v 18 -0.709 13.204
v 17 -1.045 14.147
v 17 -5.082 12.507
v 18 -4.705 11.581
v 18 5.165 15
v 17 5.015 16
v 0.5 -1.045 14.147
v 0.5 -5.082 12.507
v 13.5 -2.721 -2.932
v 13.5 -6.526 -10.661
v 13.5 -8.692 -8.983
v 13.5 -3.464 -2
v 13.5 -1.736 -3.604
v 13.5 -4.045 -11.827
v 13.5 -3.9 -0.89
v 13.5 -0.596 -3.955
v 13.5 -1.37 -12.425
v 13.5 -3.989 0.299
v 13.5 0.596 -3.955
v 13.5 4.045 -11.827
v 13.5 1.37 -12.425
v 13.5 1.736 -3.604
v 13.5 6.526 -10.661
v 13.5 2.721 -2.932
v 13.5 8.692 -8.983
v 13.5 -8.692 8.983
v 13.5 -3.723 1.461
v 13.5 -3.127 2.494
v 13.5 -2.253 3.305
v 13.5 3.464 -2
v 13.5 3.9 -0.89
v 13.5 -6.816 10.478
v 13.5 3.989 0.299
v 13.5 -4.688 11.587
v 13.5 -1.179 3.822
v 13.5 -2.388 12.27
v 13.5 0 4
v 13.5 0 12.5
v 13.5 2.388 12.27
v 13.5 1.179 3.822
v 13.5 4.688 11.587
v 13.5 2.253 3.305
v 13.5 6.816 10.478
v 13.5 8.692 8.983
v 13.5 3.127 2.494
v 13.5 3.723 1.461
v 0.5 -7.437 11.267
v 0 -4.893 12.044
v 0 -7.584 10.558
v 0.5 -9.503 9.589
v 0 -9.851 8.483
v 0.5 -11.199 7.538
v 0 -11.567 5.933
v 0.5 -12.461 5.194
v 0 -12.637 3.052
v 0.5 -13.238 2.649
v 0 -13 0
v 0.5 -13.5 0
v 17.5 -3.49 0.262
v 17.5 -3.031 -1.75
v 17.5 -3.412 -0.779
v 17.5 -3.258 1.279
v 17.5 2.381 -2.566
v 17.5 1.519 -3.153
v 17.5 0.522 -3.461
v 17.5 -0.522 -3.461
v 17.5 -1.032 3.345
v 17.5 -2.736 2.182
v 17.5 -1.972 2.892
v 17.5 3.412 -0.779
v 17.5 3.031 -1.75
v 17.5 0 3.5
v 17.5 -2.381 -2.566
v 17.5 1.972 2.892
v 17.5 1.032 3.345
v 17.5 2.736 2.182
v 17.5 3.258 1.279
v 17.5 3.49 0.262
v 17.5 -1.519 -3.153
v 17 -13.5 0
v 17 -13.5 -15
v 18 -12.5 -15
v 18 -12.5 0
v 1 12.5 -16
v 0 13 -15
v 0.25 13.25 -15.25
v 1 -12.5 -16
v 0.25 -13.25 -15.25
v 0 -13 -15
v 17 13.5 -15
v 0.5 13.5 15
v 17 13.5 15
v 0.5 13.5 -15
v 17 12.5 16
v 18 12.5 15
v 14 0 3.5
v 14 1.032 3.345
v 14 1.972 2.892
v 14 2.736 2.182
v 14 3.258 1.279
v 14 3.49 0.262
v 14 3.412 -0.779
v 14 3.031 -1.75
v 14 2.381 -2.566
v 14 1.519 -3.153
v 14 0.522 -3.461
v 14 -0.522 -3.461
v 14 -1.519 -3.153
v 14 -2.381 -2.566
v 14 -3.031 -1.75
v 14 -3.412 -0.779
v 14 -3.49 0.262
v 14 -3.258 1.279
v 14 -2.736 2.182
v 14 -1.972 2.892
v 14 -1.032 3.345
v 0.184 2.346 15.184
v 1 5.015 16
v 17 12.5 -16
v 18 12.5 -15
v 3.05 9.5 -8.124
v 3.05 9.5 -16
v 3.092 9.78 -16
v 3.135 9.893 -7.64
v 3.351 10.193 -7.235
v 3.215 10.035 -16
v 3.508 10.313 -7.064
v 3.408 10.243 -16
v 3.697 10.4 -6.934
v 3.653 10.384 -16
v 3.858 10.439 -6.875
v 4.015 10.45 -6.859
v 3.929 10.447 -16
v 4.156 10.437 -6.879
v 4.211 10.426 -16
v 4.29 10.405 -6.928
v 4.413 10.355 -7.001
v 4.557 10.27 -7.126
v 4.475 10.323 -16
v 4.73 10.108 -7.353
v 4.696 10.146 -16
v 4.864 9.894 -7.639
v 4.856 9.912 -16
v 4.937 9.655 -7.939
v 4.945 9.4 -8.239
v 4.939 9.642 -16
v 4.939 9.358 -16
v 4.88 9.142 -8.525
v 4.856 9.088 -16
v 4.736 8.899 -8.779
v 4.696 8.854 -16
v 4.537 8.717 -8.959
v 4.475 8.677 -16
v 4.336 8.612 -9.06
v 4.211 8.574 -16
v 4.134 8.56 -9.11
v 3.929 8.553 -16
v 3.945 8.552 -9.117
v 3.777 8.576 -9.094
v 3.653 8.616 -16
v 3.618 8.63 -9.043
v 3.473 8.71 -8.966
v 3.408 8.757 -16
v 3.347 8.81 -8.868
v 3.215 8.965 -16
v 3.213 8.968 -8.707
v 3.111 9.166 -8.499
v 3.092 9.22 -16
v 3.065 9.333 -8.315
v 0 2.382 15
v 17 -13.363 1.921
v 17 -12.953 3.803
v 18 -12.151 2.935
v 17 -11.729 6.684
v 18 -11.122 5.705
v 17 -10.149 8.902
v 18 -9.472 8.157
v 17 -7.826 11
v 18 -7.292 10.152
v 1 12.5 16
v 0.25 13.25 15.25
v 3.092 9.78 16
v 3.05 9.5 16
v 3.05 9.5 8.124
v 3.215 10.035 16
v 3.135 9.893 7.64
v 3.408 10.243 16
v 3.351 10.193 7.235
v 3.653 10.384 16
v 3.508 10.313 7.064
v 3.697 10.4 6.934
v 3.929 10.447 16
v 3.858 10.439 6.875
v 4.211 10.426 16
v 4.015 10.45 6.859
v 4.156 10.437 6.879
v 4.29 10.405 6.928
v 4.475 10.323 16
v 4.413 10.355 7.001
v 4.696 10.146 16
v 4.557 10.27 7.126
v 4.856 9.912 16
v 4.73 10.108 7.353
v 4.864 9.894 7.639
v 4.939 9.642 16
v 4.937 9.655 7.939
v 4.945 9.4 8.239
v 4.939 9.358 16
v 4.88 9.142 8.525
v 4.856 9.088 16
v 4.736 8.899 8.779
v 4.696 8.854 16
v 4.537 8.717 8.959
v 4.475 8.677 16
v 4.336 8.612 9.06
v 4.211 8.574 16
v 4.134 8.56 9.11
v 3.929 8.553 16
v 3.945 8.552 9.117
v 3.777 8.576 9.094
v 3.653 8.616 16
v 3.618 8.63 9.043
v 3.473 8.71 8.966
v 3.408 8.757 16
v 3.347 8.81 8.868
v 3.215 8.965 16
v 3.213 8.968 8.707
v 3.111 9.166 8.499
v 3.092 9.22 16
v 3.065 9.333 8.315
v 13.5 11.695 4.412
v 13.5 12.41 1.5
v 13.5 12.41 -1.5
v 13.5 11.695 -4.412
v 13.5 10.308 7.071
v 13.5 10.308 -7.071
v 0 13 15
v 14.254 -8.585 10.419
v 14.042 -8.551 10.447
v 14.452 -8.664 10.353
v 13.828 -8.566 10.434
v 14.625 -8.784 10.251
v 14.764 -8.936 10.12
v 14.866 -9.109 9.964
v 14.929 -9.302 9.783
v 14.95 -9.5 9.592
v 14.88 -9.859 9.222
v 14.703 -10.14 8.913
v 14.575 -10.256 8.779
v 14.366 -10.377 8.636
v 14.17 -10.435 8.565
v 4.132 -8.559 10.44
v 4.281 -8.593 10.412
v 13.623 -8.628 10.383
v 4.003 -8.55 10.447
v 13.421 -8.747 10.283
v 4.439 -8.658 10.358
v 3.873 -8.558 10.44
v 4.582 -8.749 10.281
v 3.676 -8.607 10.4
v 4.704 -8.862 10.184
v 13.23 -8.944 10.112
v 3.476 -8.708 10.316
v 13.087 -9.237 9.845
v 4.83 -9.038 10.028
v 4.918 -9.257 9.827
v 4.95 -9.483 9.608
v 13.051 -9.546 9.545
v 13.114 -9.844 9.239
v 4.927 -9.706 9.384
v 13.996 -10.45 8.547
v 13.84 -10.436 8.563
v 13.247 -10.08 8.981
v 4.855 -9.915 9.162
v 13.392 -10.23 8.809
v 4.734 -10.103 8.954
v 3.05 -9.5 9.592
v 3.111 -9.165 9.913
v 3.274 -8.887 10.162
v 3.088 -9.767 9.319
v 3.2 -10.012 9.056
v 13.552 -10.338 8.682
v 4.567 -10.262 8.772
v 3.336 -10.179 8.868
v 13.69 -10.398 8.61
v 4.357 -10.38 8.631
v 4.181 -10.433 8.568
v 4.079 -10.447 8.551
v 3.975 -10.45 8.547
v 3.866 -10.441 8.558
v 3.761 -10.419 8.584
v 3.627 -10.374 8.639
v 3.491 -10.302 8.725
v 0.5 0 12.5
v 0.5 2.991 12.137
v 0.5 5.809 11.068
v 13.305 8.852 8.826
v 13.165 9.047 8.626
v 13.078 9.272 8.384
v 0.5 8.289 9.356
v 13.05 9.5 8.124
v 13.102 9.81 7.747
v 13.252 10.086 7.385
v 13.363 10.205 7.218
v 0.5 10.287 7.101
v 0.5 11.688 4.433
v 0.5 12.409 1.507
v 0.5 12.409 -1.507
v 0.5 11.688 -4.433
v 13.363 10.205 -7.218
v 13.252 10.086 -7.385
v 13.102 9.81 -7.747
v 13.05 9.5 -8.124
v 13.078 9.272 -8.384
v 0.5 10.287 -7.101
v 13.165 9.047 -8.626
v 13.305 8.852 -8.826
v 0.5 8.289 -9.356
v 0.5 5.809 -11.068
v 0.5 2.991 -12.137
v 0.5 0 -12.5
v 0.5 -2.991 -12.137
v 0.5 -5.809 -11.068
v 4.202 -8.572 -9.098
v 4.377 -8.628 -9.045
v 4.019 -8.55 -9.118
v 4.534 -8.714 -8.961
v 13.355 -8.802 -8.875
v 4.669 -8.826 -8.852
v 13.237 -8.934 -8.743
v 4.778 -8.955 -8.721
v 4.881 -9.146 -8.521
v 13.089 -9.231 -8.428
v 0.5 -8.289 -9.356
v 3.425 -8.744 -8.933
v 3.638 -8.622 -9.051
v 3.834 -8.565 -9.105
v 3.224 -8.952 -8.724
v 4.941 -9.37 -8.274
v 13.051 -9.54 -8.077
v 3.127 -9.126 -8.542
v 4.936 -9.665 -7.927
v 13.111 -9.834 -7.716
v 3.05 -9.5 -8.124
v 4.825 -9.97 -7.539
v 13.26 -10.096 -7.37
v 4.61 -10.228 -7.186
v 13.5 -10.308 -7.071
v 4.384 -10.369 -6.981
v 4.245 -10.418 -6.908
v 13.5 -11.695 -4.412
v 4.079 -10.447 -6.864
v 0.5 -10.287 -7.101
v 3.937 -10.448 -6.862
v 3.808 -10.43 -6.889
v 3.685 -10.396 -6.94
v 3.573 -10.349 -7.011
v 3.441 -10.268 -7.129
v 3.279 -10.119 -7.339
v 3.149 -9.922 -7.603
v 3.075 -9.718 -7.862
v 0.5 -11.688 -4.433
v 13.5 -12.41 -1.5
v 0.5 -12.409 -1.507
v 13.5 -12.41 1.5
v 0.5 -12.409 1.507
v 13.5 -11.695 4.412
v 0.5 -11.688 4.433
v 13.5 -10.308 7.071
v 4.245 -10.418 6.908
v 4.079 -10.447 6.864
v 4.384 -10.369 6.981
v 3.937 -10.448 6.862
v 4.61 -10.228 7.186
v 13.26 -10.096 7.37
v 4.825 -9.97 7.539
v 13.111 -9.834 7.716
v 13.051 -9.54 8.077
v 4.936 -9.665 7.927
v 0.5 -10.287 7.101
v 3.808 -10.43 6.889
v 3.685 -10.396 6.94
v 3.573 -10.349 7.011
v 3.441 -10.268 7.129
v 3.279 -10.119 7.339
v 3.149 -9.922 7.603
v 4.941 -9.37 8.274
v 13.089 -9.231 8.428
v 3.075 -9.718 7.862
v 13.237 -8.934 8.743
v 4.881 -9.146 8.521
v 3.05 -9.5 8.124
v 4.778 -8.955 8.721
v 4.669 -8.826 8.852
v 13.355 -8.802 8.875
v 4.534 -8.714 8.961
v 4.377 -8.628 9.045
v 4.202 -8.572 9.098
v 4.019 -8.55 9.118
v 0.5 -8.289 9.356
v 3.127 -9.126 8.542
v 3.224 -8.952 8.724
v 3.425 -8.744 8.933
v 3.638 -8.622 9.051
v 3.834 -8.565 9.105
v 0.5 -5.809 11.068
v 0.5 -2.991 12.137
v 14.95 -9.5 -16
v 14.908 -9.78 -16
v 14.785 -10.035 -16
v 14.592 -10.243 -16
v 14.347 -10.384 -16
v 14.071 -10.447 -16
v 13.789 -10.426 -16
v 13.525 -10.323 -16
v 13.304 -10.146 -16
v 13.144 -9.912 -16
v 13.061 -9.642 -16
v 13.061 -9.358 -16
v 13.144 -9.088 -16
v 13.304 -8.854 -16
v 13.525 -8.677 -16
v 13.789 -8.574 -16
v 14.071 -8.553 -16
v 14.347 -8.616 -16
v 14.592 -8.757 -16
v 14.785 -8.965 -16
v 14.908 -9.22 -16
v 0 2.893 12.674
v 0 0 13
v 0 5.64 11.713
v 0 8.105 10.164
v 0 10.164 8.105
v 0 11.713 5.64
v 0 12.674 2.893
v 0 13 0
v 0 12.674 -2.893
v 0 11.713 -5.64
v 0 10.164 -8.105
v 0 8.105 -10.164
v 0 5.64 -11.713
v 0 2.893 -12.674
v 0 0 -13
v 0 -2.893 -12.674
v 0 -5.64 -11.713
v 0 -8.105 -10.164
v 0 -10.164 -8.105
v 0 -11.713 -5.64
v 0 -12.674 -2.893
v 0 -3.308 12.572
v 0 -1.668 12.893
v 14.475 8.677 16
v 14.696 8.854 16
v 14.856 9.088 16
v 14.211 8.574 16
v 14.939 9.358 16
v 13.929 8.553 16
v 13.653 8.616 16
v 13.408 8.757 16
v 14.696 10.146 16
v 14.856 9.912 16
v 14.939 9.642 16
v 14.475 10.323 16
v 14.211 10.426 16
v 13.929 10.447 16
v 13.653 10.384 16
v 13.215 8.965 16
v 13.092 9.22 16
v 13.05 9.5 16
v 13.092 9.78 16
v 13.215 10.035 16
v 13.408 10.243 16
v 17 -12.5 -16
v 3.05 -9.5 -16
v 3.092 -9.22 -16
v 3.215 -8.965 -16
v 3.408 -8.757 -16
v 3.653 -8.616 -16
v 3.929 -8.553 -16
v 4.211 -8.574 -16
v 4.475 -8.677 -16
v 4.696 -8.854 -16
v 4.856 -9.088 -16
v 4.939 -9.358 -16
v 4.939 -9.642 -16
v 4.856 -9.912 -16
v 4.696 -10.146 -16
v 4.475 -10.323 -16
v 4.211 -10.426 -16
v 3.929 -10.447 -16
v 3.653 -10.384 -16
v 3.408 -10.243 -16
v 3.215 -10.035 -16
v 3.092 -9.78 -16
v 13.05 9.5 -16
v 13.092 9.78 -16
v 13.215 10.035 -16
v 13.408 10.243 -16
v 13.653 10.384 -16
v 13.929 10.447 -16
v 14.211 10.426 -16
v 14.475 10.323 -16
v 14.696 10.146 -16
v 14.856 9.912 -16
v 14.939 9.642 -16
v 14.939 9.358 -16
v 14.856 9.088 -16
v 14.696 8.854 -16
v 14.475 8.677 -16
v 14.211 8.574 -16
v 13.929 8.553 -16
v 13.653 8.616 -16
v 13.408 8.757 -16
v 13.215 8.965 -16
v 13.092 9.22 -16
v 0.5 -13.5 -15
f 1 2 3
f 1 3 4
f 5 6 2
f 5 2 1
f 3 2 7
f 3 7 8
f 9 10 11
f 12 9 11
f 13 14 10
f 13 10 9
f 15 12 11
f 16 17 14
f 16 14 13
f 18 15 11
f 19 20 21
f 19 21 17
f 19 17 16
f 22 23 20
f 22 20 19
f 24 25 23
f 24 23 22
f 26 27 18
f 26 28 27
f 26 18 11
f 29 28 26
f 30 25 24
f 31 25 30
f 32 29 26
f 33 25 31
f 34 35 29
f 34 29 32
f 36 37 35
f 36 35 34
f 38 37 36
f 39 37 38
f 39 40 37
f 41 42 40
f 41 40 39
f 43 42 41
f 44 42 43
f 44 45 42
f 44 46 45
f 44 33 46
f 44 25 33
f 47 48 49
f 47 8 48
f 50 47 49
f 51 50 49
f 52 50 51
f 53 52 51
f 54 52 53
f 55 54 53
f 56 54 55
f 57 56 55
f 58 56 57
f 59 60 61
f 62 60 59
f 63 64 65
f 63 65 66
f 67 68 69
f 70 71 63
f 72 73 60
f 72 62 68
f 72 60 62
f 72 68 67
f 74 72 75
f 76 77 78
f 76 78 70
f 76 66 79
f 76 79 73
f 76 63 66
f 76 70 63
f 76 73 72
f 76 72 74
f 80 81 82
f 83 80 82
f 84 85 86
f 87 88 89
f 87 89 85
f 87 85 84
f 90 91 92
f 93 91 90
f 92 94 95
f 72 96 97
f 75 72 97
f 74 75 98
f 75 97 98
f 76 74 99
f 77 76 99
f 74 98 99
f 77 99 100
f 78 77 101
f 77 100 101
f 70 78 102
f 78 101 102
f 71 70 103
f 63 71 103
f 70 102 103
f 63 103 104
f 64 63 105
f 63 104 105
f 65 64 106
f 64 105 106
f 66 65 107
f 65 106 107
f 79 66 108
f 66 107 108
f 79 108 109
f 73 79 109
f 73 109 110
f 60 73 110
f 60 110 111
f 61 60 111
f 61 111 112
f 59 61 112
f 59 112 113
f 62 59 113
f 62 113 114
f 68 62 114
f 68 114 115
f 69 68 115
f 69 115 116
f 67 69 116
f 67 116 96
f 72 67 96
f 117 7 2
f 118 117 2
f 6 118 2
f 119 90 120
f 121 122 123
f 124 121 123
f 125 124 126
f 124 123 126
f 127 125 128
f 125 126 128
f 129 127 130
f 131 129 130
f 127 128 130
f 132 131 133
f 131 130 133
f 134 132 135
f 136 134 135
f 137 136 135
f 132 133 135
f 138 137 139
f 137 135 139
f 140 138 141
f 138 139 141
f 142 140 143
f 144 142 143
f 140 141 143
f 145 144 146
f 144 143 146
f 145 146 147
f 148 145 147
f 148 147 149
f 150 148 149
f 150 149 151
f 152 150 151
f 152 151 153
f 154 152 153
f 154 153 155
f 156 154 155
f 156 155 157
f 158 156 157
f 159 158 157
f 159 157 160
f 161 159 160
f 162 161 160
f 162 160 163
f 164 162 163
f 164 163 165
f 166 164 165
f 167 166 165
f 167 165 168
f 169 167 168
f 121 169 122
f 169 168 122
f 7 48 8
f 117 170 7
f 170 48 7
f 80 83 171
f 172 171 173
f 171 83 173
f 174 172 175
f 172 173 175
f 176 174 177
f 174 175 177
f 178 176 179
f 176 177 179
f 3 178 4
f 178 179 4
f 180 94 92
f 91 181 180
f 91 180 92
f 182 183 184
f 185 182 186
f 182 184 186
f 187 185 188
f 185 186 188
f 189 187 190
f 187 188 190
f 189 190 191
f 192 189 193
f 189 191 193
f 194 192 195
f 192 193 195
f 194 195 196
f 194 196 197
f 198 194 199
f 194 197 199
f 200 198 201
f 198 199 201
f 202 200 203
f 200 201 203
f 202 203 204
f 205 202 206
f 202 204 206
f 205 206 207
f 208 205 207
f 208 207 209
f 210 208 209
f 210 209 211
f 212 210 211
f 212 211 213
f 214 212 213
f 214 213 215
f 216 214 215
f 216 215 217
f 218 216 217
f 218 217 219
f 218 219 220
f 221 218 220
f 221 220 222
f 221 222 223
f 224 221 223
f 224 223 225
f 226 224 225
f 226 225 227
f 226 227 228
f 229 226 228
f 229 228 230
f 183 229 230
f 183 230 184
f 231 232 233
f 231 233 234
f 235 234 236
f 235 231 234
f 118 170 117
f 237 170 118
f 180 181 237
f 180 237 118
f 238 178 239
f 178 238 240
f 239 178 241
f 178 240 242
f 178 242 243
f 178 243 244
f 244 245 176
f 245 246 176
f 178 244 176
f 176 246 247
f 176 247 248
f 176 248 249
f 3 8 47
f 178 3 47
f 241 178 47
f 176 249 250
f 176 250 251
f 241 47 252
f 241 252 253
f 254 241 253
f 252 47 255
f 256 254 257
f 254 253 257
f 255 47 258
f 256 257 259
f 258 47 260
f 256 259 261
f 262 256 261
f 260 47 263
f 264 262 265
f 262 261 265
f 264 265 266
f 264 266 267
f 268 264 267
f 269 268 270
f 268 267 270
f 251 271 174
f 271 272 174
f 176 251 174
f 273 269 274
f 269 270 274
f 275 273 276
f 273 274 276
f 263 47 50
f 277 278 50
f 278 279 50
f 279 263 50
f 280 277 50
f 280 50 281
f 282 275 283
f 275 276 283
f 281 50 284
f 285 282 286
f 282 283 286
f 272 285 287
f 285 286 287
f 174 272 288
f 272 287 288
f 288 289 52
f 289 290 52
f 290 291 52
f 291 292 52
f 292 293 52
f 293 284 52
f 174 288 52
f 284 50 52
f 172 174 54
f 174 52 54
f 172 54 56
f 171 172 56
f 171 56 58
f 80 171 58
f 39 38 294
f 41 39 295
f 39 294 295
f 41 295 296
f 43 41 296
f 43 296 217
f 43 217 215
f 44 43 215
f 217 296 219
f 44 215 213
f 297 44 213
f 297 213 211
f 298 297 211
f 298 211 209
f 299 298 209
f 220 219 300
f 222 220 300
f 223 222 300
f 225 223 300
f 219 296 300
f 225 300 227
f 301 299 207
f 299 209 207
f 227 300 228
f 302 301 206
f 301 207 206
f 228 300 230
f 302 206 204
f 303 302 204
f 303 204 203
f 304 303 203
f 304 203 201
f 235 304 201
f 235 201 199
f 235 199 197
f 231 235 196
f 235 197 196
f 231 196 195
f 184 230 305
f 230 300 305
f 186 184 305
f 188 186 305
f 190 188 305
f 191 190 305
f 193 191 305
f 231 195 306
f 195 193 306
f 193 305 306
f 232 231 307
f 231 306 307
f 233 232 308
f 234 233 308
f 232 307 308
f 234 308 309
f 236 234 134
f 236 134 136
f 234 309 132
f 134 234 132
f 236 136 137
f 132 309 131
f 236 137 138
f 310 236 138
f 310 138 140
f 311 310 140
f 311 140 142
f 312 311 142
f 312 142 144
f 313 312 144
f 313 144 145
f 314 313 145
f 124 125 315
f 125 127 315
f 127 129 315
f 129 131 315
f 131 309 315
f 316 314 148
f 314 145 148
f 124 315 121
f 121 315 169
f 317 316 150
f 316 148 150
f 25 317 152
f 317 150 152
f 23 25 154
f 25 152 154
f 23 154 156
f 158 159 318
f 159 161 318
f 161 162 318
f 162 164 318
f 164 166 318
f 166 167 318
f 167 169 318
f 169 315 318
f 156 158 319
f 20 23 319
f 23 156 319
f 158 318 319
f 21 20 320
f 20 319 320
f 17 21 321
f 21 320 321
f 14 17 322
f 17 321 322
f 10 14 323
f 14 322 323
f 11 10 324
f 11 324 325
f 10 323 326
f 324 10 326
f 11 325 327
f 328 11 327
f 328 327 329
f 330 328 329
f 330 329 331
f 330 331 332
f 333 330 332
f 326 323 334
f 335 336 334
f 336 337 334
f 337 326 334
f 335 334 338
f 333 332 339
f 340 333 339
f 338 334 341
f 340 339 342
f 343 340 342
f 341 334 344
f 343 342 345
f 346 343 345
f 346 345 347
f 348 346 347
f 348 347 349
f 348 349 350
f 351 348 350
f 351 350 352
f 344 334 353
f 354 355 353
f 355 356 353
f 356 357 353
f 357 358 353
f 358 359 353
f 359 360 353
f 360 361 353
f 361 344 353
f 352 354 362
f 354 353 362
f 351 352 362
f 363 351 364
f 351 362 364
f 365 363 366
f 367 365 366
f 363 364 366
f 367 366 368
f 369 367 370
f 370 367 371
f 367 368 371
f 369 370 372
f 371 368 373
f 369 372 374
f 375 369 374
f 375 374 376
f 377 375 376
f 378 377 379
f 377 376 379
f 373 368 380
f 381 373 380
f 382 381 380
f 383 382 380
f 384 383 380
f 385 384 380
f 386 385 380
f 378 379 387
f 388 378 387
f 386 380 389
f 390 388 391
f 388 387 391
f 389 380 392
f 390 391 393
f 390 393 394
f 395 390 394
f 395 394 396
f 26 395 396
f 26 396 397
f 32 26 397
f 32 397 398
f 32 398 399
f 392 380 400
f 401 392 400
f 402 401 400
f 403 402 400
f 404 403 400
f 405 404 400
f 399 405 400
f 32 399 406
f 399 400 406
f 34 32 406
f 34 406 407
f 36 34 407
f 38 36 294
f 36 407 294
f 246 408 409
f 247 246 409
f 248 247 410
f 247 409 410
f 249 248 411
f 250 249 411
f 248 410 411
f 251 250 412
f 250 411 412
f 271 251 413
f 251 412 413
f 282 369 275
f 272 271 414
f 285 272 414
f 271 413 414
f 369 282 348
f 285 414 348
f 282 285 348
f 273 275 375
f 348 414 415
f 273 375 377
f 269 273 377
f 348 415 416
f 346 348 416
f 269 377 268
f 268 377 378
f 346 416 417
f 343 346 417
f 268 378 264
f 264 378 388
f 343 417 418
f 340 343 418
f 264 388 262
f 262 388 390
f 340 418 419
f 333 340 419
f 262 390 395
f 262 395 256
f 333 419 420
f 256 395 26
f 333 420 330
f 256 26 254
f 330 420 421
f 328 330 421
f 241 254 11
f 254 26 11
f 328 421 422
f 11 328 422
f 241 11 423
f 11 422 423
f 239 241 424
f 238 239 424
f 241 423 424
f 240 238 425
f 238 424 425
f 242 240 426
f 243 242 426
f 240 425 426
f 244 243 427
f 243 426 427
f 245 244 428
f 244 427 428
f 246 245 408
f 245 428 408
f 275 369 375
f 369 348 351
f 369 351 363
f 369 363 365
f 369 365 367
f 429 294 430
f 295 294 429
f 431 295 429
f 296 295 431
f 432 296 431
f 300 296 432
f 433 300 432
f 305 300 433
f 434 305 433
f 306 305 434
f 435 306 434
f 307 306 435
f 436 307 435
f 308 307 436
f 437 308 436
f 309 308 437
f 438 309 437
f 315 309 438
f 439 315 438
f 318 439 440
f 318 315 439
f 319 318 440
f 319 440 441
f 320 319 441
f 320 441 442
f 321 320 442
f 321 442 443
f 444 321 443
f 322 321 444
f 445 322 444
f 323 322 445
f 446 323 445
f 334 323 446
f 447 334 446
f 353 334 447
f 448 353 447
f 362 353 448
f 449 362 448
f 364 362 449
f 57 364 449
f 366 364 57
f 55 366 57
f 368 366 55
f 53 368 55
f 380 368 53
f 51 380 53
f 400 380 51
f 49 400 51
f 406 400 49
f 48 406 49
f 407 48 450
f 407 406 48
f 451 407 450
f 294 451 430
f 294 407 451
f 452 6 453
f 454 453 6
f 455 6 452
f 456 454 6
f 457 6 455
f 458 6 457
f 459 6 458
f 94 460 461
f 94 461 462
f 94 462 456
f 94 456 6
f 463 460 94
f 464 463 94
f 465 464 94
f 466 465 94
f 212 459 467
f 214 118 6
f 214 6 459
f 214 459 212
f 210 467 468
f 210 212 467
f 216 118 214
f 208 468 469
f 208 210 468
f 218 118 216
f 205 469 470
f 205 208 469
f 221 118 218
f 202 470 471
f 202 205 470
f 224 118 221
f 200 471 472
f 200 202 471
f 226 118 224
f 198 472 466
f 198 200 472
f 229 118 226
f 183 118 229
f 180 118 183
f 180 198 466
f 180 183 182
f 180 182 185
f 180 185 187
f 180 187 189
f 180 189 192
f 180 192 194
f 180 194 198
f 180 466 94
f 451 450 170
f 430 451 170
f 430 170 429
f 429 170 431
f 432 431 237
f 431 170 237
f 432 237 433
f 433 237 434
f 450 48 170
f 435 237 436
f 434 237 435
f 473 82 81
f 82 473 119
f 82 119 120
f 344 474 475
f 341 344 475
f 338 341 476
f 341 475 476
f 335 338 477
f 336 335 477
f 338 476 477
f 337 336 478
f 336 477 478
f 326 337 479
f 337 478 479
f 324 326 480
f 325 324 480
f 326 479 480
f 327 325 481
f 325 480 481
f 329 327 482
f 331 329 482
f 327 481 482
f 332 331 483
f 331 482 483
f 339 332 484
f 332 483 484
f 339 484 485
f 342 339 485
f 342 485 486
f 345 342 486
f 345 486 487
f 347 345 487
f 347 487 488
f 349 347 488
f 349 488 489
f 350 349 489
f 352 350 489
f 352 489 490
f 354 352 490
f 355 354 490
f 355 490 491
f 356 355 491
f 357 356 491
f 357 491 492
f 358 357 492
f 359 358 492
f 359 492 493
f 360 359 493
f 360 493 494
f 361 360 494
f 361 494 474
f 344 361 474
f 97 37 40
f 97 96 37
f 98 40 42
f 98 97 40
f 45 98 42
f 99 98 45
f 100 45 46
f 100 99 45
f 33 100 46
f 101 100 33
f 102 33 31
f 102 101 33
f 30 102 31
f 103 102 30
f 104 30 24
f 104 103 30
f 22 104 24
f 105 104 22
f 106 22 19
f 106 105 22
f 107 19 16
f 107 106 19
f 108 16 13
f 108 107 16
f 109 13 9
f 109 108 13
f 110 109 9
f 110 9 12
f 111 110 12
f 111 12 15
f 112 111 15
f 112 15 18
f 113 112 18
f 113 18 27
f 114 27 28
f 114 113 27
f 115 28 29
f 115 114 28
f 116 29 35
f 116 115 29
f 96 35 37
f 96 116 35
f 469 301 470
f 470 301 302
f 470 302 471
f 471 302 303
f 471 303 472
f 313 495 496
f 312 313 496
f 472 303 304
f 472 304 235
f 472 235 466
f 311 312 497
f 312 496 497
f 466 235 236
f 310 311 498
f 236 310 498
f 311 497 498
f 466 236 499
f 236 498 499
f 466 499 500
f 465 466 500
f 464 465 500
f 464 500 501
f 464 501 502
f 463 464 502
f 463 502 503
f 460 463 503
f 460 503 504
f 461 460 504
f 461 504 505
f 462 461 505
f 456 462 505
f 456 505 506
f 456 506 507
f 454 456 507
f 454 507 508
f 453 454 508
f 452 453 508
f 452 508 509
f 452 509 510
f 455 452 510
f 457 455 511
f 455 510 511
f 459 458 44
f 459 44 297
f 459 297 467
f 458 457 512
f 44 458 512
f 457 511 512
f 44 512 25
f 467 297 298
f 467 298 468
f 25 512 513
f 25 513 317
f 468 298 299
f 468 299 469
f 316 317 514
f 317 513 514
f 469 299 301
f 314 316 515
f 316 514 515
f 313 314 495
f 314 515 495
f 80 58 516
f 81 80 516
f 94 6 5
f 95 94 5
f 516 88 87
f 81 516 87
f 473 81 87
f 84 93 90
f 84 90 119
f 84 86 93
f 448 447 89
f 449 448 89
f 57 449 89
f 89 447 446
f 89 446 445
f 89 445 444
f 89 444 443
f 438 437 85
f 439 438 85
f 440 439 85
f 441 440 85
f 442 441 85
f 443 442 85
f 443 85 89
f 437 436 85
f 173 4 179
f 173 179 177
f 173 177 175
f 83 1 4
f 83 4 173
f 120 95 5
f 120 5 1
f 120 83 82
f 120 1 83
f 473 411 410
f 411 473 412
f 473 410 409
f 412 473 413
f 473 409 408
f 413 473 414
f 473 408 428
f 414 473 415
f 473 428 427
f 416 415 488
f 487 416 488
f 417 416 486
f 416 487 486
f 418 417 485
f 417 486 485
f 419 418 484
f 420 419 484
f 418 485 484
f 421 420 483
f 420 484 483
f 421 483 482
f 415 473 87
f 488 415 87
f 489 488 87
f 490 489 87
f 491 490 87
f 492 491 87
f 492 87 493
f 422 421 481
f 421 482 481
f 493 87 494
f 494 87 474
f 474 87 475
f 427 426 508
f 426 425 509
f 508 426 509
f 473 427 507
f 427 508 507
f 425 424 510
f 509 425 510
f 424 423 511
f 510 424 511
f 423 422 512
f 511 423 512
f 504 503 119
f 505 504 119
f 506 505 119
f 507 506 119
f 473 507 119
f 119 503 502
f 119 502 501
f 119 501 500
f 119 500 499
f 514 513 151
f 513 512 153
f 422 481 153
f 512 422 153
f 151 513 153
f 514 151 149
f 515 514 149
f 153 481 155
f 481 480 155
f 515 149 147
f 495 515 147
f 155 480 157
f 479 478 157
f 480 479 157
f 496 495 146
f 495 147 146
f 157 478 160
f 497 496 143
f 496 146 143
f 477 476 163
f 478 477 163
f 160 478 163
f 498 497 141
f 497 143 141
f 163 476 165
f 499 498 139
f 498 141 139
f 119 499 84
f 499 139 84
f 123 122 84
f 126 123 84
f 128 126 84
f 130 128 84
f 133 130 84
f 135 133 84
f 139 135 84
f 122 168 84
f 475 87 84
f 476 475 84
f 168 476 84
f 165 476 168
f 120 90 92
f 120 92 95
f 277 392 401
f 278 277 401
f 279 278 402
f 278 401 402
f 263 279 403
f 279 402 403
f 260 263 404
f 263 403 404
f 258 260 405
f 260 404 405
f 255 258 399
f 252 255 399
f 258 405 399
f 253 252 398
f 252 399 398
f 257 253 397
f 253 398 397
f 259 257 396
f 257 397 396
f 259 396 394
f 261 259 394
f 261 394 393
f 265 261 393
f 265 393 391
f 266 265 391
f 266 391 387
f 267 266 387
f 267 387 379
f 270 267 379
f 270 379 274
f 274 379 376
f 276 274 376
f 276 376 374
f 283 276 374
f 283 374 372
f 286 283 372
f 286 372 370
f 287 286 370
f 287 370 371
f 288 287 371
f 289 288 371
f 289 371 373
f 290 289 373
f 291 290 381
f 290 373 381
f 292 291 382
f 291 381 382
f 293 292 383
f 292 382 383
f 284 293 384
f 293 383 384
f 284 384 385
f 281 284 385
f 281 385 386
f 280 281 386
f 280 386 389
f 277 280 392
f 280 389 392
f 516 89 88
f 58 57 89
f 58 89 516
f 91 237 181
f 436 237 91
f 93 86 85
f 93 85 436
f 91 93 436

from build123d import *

# Parameters (mm, degrees)
SKETCH_1_W          = 32
SKETCH_1_H          = 27
EXTRUDE_1_DEPTH     = 18
SKETCH_2_R          = 12.5
CUT_EXTRUDE_1_DEPTH = 13.5
SKETCH_3_R          = 3.5
CUT_EXTRUDE_2_DEPTH = 4
SKETCH_4_R          = 0.95
CUT_EXTRUDE_3_DEPTH = 40.118409988
CUT_EXTRUDE_4_DEPTH = 28.608875443
CHAMFER_2_SIZE      = 1.5
CHAMFER_2_SIZE2     = 4.921659428
CHAMFER_4_SIZE      = 0.5


with BuildPart() as part:
    # 草图1 → 凸台-拉伸1 (new body)
    with BuildSketch(Plane(origin=(0, 0, 0), x_dir=(0, 0, -1), z_dir=(1, 0, 0))):
        Rectangle(SKETCH_1_W, SKETCH_1_H)
    extrude(amount=EXTRUDE_1_DEPTH)

    # 草图2 → 切除-拉伸1 (cut)
    with BuildSketch(Plane.ZY):
        Circle(SKETCH_2_R)
    extrude(amount=-CUT_EXTRUDE_1_DEPTH, mode=Mode.SUBTRACT)

    # 草图3 → 切除-拉伸2 (cut)
    with BuildSketch(Plane.ZY.offset(-13.5)):
        Circle(SKETCH_3_R)
    extrude(amount=-CUT_EXTRUDE_2_DEPTH, mode=Mode.SUBTRACT)

    # 草图4 → 切除-拉伸3 (cut, through all)
    with BuildSketch(Plane(origin=(0, 0, -16), x_dir=(-1, 0, 0), z_dir=(0, 0, -1))):
        with Locations((-14, 9.5)):
            Circle(SKETCH_4_R)
        with Locations((-4, 9.5)):
            Circle(SKETCH_4_R)
        with Locations((-4, -9.5)):
            Circle(SKETCH_4_R)
        with Locations(Location((-14, -9.5, 0), (0, 0, 180))):
            Circle(SKETCH_4_R)
    extrude(amount=-CUT_EXTRUDE_3_DEPTH, mode=Mode.SUBTRACT)

    # 草图6 → 切除-拉伸4 (cut, through all)
    with BuildSketch(Plane.ZY):
        with BuildLine():
            Line((16, -13.5), (16, 3.515112589))
            Line((16, 3.515112589), (12.507048233, -5.08170685))
            ThreePointArc((12.507048233, -5.08170685), (7.538134966, -11.199398253), (0, -13.5))
            Line((0, -13.5), (16, -13.5))
        make_face()
    extrude(amount=-CUT_EXTRUDE_4_DEPTH, mode=Mode.SUBTRACT)

    # 倒角2
    chamfer_2_edges = [part.edges().sort_by_distance(p)[0] for p in [
        (9, 3.515112589, 16),
    ]]
    chamfer_2_side = [part.faces().sort_by_distance(p)[0] for p in [
        (9, 8.475223706, 16),
    ]]
    chamfer(chamfer_2_edges, length=CHAMFER_2_SIZE, length2=CHAMFER_2_SIZE2, reference=chamfer_2_side[0])

    # 倒角3
    # the kernel refuses this chamfer: 1 mm, written as the material it takes off along each edge
    with BuildSketch(Plane(origin=(17.333333333, 12.833333333, 15.333333333), x_dir=(-0.7071067811865475, 0, 0.7071067811865475), z_dir=(0.5773502691896258, 0.5773502691896258, 0.5773502691896258)), Plane(origin=(17.333333333, 12.833333333, -15.333333333), x_dir=(-0.7071067811865475, 0.7071067811865475, 0), z_dir=(0.5773502691896258, 0.5773502691896258, -0.5773502691896258))) as chamfer_3_piece_1:
        Polygon((-0.707106781, 0.40824829), (0.707106781, 0.40824829), (0, -0.816496581), align=None)
    extrude(amount=1.270170592, mode=Mode.SUBTRACT)
    with BuildSketch(Plane(origin=(17.333333333, -12.833333333, -15.333333333), x_dir=(-0.7071067811865475, -0.7071067811865475, 0), z_dir=(0.5773502691896258, -0.5773502691896258, -0.5773502691896258))) as chamfer_3_piece_2:
        Polygon((-0.707106781, -0.40824829), (0.707106781, -0.40824829), (0, 0.816496581), align=None)
    extrude(amount=1.270170592, mode=Mode.SUBTRACT)
    with BuildSketch(Plane(origin=(18, 16.071682988, 16), x_dir=(-1, 0, 0), z_dir=(0, -1, 0)), Plane(origin=(0, 16.071682988, 16), x_dir=(0, 0, -1), z_dir=(0, -1, 0))) as chamfer_3_piece_3:
        with BuildLine():
            Line((1.028284271, -0.028284271), (-0.028284271, 1.028284271))
            Line((-0.028284271, 1.028284271), (-0.048284271, 1.028284271))
            ThreePointArc((-0.048284271, 1.028284271), (-0.02, 0.514142136), (-0.02, 0))
            Line((-0.02, 0), (0, -0.02))
            ThreePointArc((0, -0.02), (0.514142136, -0.02), (1.028284271, -0.048284271))
            Line((1.028284271, -0.048284271), (1.028284271, -0.028284271))
        make_face()
    extrude(amount=15.428431478, mode=Mode.SUBTRACT)
    with BuildSketch(Plane(origin=(18, -16.071682988, -16), x_dir=(-1, 0, 0), z_dir=(0, 1, 0)), Plane(origin=(0, -16.071682988, -16), x_dir=(0, 0, 1), z_dir=(0, 1, 0))) as chamfer_3_piece_4:
        with BuildLine():
            Line((1.028284271, -0.028284271), (-0.028284271, 1.028284271))
            Line((-0.028284271, 1.028284271), (-0.048284271, 1.028284271))
            ThreePointArc((-0.048284271, 1.028284271), (-0.02, 0.514142136), (-0.02, 0))
            Line((-0.02, 0), (0, -0.02))
            ThreePointArc((0, -0.02), (0.514142136, -0.02), (1.028284271, -0.048284271))
            Line((1.028284271, -0.048284271), (1.028284271, -0.028284271))
        make_face()
    extrude(amount=32.143365976, mode=Mode.SUBTRACT)
    with BuildSketch(Plane(origin=(18, -13.5, 0), x_dir=(-1, 0, 0), z_dir=(0, 0, -1))) as chamfer_3_piece_5:
        with BuildLine():
            Line((1.028284271, -0.028284271), (-0.028284271, 1.028284271))
            Line((-0.028284271, 1.028284271), (-0.048284271, 1.028284271))
            ThreePointArc((-0.048284271, 1.028284271), (-0.02, 0.514142136), (-0.02, 0))
            Line((-0.02, 0), (0, -0.02))
            ThreePointArc((0, -0.02), (0.514142136, -0.02), (1.028284271, -0.048284271))
            Line((1.028284271, -0.048284271), (1.028284271, -0.028284271))
        make_face()
    extrude(amount=18.571682988, mode=Mode.SUBTRACT)
    with BuildSketch(Plane(origin=(18, 0, 0), x_dir=(0, -1, 0), z_dir=(0, 0, -1))) as chamfer_3_piece_6:
        with BuildLine():
            Line((13.528284271, 1.028284271), (12.471715729, -0.028284271))
            Line((12.471715729, -0.028284271), (12.471715729, -0.048284271))
            ThreePointArc((12.471715729, -0.048284271), (12.985857864, -0.02), (13.5, -0.02))
            Line((13.5, -0.02), (13.52, 0))
            ThreePointArc((13.52, 0), (13.52, 0.514142136), (13.548284271, 1.028284271))
            Line((13.548284271, 1.028284271), (13.528284271, 1.028284271))
        make_face()
    revolve(axis=Axis((18, 0, 0), (-1, 0, 0)), revolution_arc=67.887726461, mode=Mode.SUBTRACT)
    with BuildSketch(Plane(origin=(18, -5.08170685, 12.507048233), x_dir=(-1, 0, 0), z_dir=(0, 0.9264480172326814, 0.3764227296081273))) as chamfer_3_piece_7:
        with BuildLine():
            Line((1.028284271, 0.028284271), (-0.028284271, -1.028284271))
            Line((-0.028284271, -1.028284271), (-0.048284271, -1.028284271))
            ThreePointArc((-0.048284271, -1.028284271), (-0.02, -0.514142136), (-0.02, 0))
            Line((-0.02, 0), (0, 0.02))
            ThreePointArc((0, 0.02), (0.514142136, 0.02), (1.028284271, 0.048284271))
            Line((1.028284271, 0.048284271), (1.028284271, 0.028284271))
        make_face()
    extrude(amount=17.216088275, mode=Mode.SUBTRACT)
    with BuildSketch(Plane(origin=(18, 9.195944132, 17.278208477), x_dir=(-1, 0, 0), z_dir=(0, -0.9563047559630353, -0.2923717047227372))) as chamfer_3_piece_8:
        with BuildLine():
            Line((1.028284271, -0.028284271), (-0.028284271, 1.028284271))
            Line((-0.028284271, 1.028284271), (-0.048284271, 1.028284271))
            ThreePointArc((-0.048284271, 1.028284271), (-0.02, 0.514142136), (-0.02, 0))
            Line((-0.02, 0), (0, -0.02))
            ThreePointArc((0, -0.02), (0.514142136, -0.02), (1.028284271, -0.048284271))
            Line((1.028284271, -0.048284271), (1.028284271, -0.028284271))
        make_face()
    extrude(amount=23.566814221, mode=Mode.SUBTRACT)
    with BuildSketch(Plane(origin=(-2.571682988, -13.5, -16), x_dir=(0, 0, 1), z_dir=(1, 0, 0))) as chamfer_3_piece_9:
        with BuildLine():
            Line((1.028284271, 0.028284271), (-0.028284271, -1.028284271))
            Line((-0.028284271, -1.028284271), (-0.048284271, -1.028284271))
            ThreePointArc((-0.048284271, -1.028284271), (-0.02, -0.514142136), (-0.02, 0))
            Line((-0.02, 0), (0, 0.02))
            ThreePointArc((0, 0.02), (0.514142136, 0.02), (1.028284271, 0.048284271))
            Line((1.028284271, 0.048284271), (1.028284271, 0.028284271))
        make_face()
    extrude(amount=23.143365976, mode=Mode.SUBTRACT)
    with BuildSketch(Plane(origin=(-2.571682988, 13.5, 16), x_dir=(0, -1, 0), z_dir=(1, 0, 0)), Plane(origin=(-2.571682988, 13.5, -16), x_dir=(0, 0, 1), z_dir=(1, 0, 0))) as chamfer_3_piece_10:
        with BuildLine():
            Line((1.028284271, -0.028284271), (-0.028284271, 1.028284271))
            Line((-0.028284271, 1.028284271), (-0.048284271, 1.028284271))
            ThreePointArc((-0.048284271, 1.028284271), (-0.02, 0.514142136), (-0.02, 0))
            Line((-0.02, 0), (0, -0.02))
            ThreePointArc((0, -0.02), (0.514142136, -0.02), (1.028284271, -0.048284271))
            Line((1.028284271, -0.048284271), (1.028284271, -0.028284271))
        make_face()
    extrude(amount=23.143365976, mode=Mode.SUBTRACT)
    with BuildSketch(Plane(origin=(18, 13.5, -18.571682988), x_dir=(-1, 0, 0), z_dir=(0, 0, 1))) as chamfer_3_piece_11:
        with BuildLine():
            Line((1.028284271, -0.028284271), (-0.028284271, 1.028284271))
            Line((-0.028284271, 1.028284271), (-0.048284271, 1.028284271))
            ThreePointArc((-0.048284271, 1.028284271), (-0.02, 0.514142136), (-0.02, 0))
            Line((-0.02, 0), (0, -0.02))
            ThreePointArc((0, -0.02), (0.514142136, -0.02), (1.028284271, -0.048284271))
            Line((1.028284271, -0.048284271), (1.028284271, -0.028284271))
        make_face()
    extrude(amount=37.143365976, mode=Mode.SUBTRACT)

    # 倒角4
    # the kernel refuses this chamfer: 0.5 mm, written as the material it takes off along each edge
    with BuildSketch(Plane(origin=(0, 13.5, -16.285841494), x_dir=(0, -1, 0), z_dir=(0, 0, 1))) as chamfer_4_piece_1:
        Polygon((CHAMFER_4_SIZE, 0), (0, CHAMFER_4_SIZE), (0, 0), align=None)
    extrude(amount=32.571682988, mode=Mode.SUBTRACT)
    with BuildSketch(Plane(origin=(0, 4.911777484, 16.567475349), x_dir=(0, 0.3764227296081273, -0.9264480172326813), z_dir=(0, -0.9264480172326814, -0.3764227296081273))) as chamfer_4_piece_2:
        Polygon((CHAMFER_4_SIZE, 0), (0, CHAMFER_4_SIZE), (0, 0), align=None)
    extrude(amount=10.786880805, mode=Mode.SUBTRACT)
    with BuildSketch(Plane(origin=(0, 0, 0), x_dir=(0, -0.3764227296081274, 0.9264480172326813), z_dir=(0, 0.9264480172326813, 0.3764227296081274))) as chamfer_4_piece_3:
        Polygon((13.5 - CHAMFER_4_SIZE, 0), (13.5, CHAMFER_4_SIZE), (13.5, 0), align=None)
    revolve(axis=Axis((0, 0, 0), (1, 0, 0)), revolution_arc=67.887726461, mode=Mode.SUBTRACT)
    with BuildSketch(Plane(origin=(0, -13.5, 0), x_dir=(0, 1, 0), z_dir=(0, 0, -1))) as chamfer_4_piece_4:
        Polygon((CHAMFER_4_SIZE, 0), (0, CHAMFER_4_SIZE), (0, 0), align=None)
    extrude(amount=16.285841494, mode=Mode.SUBTRACT)
    with BuildSketch(Plane(origin=(0, 0, 0), x_dir=(0, 0, 1), z_dir=(0, -1, 0))) as chamfer_4_piece_5:
        Polygon((12.5 + CHAMFER_4_SIZE, 0), (12.5, -CHAMFER_4_SIZE), (12.5, 0), align=None)
    revolve(axis=Axis((0, 0, 0), (-1, 0, 0)), mode=Mode.SUBTRACT)
    with BuildSketch(Plane(origin=(13.5, 0, 0), x_dir=(0, 0, 1), z_dir=(0, -1, 0))) as chamfer_4_piece_6:
        Polygon((3.5 + CHAMFER_4_SIZE, 0), (3.5, -CHAMFER_4_SIZE), (3.5, 0), align=None)
    revolve(axis=Axis((13.5, 0, 0), (-1, 0, 0)), mode=Mode.SUBTRACT)


solid = part.part
